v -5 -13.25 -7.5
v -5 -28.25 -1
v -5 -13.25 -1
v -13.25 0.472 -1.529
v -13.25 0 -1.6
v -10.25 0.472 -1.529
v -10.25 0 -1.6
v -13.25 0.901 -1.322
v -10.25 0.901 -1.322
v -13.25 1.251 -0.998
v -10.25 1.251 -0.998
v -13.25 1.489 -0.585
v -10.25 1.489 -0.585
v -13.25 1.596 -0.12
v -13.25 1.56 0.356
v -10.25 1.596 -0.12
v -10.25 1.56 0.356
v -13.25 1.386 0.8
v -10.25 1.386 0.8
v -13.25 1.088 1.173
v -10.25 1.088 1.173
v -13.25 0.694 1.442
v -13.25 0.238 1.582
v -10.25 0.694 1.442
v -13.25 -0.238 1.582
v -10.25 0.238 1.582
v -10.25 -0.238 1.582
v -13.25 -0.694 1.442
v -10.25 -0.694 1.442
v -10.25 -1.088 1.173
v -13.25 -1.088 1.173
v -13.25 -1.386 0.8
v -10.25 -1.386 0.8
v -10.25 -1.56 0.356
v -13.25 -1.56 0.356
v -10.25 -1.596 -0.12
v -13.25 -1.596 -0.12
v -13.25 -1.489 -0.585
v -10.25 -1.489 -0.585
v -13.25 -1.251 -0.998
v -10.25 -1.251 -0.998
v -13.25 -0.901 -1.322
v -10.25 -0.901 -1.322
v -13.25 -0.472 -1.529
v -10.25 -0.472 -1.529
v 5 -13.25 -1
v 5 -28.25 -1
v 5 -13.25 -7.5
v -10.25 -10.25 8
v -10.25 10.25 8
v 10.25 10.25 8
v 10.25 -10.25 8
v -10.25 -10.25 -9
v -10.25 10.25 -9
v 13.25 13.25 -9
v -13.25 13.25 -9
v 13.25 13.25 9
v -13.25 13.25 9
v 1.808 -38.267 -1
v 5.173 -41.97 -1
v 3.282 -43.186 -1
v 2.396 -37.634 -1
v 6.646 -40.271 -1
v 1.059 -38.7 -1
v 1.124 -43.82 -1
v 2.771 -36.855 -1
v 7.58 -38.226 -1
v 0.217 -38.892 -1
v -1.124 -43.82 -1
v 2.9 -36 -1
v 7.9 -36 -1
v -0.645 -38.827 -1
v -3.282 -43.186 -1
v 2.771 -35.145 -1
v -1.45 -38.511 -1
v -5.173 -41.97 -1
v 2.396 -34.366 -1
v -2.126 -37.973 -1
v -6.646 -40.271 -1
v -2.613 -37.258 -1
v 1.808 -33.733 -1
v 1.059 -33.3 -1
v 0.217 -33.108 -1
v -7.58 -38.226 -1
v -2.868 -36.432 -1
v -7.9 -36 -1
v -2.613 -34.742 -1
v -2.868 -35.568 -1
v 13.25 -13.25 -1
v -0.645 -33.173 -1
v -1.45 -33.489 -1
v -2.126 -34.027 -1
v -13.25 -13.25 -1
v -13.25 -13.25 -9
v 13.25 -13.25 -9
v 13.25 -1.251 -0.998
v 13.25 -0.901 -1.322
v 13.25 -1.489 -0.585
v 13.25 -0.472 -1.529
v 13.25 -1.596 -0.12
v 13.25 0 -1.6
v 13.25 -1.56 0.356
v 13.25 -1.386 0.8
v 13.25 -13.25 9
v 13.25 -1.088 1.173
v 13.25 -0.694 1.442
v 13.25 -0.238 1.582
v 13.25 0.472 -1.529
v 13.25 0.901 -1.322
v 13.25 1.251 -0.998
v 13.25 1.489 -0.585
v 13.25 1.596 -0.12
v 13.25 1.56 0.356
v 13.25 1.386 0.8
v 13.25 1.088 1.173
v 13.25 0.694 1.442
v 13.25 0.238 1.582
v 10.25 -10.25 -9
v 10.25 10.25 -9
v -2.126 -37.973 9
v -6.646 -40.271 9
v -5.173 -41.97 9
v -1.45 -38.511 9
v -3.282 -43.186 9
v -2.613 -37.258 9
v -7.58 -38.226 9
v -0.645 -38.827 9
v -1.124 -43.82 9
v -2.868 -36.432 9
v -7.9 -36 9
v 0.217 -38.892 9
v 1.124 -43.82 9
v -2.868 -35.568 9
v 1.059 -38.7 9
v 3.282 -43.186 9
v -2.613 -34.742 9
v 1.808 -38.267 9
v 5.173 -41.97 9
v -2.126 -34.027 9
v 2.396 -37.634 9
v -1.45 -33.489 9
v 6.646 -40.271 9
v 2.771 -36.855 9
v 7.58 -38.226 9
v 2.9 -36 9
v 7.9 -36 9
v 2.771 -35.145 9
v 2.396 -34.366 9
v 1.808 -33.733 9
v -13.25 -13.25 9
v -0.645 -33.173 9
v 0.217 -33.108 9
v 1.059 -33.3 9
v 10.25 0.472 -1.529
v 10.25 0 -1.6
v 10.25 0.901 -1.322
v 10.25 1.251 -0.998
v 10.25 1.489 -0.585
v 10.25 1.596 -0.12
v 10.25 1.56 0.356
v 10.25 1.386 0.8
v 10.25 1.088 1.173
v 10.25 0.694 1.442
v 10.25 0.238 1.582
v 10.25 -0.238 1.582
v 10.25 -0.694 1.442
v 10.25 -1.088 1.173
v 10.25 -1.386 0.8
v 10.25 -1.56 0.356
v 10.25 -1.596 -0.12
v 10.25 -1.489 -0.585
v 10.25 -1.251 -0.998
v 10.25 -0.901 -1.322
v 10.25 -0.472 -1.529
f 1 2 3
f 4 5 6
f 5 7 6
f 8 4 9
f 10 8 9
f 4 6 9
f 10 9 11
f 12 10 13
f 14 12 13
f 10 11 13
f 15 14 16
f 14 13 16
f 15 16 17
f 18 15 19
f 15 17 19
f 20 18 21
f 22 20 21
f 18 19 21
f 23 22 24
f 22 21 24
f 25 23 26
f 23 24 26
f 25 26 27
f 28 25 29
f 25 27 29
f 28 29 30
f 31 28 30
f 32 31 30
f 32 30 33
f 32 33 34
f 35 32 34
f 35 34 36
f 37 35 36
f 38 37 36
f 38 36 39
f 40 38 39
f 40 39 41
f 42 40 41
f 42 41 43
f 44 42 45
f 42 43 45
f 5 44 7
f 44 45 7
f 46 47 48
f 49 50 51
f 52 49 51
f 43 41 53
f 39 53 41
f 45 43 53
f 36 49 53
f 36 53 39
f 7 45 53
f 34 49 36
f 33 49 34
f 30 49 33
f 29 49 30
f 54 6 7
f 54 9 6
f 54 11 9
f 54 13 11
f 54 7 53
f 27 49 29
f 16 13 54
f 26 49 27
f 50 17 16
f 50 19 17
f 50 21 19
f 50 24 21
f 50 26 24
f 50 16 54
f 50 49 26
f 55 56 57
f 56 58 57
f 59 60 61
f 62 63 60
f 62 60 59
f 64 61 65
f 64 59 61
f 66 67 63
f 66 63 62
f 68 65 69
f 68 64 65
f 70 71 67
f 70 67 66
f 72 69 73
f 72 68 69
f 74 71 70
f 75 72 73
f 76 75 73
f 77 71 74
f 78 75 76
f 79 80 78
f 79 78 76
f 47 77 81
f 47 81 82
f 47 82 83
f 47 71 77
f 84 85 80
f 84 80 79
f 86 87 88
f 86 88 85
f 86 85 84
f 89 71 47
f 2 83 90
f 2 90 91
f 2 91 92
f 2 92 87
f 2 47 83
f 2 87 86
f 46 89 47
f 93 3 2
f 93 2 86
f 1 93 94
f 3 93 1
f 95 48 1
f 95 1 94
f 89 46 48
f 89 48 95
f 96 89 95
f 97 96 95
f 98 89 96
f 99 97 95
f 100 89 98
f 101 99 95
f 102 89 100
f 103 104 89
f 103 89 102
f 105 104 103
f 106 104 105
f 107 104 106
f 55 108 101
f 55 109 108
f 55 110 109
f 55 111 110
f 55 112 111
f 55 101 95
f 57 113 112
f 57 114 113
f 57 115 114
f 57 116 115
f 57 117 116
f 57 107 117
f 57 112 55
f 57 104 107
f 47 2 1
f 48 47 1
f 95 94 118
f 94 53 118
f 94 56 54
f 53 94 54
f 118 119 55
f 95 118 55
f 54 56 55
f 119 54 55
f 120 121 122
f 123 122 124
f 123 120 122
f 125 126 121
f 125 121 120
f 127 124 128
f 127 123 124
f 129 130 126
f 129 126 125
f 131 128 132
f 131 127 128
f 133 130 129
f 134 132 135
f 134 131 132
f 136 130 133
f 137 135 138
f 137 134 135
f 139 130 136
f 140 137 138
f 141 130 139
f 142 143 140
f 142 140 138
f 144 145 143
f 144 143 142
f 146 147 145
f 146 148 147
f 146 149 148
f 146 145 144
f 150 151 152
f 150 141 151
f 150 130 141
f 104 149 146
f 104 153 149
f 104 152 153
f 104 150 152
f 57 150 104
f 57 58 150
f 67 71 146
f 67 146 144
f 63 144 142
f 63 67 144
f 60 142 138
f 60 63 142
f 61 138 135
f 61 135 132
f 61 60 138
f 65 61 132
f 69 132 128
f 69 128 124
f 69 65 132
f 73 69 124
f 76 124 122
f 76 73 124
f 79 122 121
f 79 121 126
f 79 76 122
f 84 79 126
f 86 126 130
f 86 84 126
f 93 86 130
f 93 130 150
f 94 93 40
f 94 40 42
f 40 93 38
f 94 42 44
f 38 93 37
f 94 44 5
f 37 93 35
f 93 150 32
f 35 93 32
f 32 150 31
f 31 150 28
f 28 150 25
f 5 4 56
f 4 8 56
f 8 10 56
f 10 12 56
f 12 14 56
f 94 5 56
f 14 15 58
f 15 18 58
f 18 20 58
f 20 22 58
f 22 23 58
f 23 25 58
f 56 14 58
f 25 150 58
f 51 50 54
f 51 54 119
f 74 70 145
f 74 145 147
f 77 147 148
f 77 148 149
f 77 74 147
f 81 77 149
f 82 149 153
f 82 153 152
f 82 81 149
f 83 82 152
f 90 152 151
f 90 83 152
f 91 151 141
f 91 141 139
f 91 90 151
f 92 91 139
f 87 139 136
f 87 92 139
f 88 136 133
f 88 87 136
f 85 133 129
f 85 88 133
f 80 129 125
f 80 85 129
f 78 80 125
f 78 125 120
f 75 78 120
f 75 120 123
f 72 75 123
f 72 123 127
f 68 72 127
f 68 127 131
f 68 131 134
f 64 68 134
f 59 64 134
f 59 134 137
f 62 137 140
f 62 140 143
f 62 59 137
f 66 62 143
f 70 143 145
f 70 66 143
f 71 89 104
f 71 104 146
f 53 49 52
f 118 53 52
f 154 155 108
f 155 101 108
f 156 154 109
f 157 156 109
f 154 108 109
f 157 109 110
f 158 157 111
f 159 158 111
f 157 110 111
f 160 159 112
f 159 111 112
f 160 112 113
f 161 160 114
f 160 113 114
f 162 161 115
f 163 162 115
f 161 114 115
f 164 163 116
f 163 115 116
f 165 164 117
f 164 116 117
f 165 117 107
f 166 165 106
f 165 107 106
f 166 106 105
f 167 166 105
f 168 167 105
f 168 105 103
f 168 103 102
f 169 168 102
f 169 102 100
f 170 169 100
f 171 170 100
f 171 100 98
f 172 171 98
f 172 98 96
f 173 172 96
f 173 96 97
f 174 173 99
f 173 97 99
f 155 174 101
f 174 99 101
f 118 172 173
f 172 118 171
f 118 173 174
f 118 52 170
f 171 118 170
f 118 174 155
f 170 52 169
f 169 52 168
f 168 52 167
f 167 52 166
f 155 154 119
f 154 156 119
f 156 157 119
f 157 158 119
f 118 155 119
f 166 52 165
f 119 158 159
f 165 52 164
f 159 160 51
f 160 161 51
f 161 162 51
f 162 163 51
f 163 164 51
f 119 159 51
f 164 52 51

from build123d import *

# Parameters (mm, degrees)
CROQUIS1_W                   = 26.5
CROQUIS1_H                   = 26.5
CROQUIS1_W_2                 = 20.5
CROQUIS1_H_2                 = 20.5
SALIENTE_EXTRUIR1_DEPTH      = 9
SALIENTE_EXTRUIR2_DEPTH      = 9
SALIENTE_EXTRUIR2_DEPTH_BACK = 1
CROQUIS2_R                   = 2.9
CROQUIS5_W                   = 20.5
CROQUIS5_H                   = 20.5
SALIENTE_EXTRUIR3_DEPTH      = 1
NERVIO6_REACH                = 48.731
CROQUIS3_WALL_W              = 111.809486112
CROQUIS3_WALL_H              = 10
CROQUIS4_R                   = 1.6
CORTAR_EXTRUIR2_DEPTH        = 25


with BuildPart() as part:
    # Croquis1 → Saliente-Extruir1 (new, symmetric)
    with BuildSketch(Plane.XY):
        Rectangle(CROQUIS1_W, CROQUIS1_H)
        Rectangle(CROQUIS1_W_2, CROQUIS1_H_2, mode=Mode.SUBTRACT)
    extrude(amount=SALIENTE_EXTRUIR1_DEPTH, both=True)

    # Croquis2 → Saliente-Extruir2 (add, two sides: drawn at the far end of the back side and taken through both)
    with BuildSketch(Plane.XY.offset(-SALIENTE_EXTRUIR2_DEPTH_BACK)):
        with BuildLine():
            Line((-7.9, -36), (-13.25, -13.25))
            Line((-13.25, -13.25), (13.25, -13.25))
            Line((13.25, -13.25), (7.9, -36))
            ThreePointArc((7.9, -36), (0, -43.9), (-7.9, -36))
        make_face()
        with Locations((0, -36)):
            Circle(CROQUIS2_R, mode=Mode.SUBTRACT)
    extrude(amount=SALIENTE_EXTRUIR2_DEPTH + SALIENTE_EXTRUIR2_DEPTH_BACK)

    # Croquis5 → Saliente-Extruir3 (add)
    with BuildSketch(Plane.XY.offset(9)):
        Rectangle(CROQUIS5_W, CROQUIS5_H)
    extrude(amount=-SALIENTE_EXTRUIR3_DEPTH)

    # Croquis3 wall → Nervio6 (add, up to next)
    with BuildSketch(Plane(origin=(0, -20.75, -4.25), x_dir=(0, 0.91755562531, -0.397607437634), z_dir=(0, 0.397607437634, 0.91755562531)), mode=Mode.PRIVATE) as nervio6_sk1:
        Rectangle(CROQUIS3_WALL_W, CROQUIS3_WALL_H)
    nervio6_tool1 = extrude(nervio6_sk1.sketch, amount=NERVIO6_REACH, mode=Mode.PRIVATE) - part.part
    add(nervio6_tool1.solids().sort_by_distance((0, -20.75, -4.25))[0])

    # Croquis4 → Cortar-Extruir2 (cut, symmetric)
    with BuildSketch(Plane(origin=(0, 0, 0), x_dir=(0, 0, -1), z_dir=(1, 0, 0))):
        Circle(CROQUIS4_R)
    extrude(amount=CORTAR_EXTRUIR2_DEPTH, both=True, mode=Mode.SUBTRACT)


solid = part.part
